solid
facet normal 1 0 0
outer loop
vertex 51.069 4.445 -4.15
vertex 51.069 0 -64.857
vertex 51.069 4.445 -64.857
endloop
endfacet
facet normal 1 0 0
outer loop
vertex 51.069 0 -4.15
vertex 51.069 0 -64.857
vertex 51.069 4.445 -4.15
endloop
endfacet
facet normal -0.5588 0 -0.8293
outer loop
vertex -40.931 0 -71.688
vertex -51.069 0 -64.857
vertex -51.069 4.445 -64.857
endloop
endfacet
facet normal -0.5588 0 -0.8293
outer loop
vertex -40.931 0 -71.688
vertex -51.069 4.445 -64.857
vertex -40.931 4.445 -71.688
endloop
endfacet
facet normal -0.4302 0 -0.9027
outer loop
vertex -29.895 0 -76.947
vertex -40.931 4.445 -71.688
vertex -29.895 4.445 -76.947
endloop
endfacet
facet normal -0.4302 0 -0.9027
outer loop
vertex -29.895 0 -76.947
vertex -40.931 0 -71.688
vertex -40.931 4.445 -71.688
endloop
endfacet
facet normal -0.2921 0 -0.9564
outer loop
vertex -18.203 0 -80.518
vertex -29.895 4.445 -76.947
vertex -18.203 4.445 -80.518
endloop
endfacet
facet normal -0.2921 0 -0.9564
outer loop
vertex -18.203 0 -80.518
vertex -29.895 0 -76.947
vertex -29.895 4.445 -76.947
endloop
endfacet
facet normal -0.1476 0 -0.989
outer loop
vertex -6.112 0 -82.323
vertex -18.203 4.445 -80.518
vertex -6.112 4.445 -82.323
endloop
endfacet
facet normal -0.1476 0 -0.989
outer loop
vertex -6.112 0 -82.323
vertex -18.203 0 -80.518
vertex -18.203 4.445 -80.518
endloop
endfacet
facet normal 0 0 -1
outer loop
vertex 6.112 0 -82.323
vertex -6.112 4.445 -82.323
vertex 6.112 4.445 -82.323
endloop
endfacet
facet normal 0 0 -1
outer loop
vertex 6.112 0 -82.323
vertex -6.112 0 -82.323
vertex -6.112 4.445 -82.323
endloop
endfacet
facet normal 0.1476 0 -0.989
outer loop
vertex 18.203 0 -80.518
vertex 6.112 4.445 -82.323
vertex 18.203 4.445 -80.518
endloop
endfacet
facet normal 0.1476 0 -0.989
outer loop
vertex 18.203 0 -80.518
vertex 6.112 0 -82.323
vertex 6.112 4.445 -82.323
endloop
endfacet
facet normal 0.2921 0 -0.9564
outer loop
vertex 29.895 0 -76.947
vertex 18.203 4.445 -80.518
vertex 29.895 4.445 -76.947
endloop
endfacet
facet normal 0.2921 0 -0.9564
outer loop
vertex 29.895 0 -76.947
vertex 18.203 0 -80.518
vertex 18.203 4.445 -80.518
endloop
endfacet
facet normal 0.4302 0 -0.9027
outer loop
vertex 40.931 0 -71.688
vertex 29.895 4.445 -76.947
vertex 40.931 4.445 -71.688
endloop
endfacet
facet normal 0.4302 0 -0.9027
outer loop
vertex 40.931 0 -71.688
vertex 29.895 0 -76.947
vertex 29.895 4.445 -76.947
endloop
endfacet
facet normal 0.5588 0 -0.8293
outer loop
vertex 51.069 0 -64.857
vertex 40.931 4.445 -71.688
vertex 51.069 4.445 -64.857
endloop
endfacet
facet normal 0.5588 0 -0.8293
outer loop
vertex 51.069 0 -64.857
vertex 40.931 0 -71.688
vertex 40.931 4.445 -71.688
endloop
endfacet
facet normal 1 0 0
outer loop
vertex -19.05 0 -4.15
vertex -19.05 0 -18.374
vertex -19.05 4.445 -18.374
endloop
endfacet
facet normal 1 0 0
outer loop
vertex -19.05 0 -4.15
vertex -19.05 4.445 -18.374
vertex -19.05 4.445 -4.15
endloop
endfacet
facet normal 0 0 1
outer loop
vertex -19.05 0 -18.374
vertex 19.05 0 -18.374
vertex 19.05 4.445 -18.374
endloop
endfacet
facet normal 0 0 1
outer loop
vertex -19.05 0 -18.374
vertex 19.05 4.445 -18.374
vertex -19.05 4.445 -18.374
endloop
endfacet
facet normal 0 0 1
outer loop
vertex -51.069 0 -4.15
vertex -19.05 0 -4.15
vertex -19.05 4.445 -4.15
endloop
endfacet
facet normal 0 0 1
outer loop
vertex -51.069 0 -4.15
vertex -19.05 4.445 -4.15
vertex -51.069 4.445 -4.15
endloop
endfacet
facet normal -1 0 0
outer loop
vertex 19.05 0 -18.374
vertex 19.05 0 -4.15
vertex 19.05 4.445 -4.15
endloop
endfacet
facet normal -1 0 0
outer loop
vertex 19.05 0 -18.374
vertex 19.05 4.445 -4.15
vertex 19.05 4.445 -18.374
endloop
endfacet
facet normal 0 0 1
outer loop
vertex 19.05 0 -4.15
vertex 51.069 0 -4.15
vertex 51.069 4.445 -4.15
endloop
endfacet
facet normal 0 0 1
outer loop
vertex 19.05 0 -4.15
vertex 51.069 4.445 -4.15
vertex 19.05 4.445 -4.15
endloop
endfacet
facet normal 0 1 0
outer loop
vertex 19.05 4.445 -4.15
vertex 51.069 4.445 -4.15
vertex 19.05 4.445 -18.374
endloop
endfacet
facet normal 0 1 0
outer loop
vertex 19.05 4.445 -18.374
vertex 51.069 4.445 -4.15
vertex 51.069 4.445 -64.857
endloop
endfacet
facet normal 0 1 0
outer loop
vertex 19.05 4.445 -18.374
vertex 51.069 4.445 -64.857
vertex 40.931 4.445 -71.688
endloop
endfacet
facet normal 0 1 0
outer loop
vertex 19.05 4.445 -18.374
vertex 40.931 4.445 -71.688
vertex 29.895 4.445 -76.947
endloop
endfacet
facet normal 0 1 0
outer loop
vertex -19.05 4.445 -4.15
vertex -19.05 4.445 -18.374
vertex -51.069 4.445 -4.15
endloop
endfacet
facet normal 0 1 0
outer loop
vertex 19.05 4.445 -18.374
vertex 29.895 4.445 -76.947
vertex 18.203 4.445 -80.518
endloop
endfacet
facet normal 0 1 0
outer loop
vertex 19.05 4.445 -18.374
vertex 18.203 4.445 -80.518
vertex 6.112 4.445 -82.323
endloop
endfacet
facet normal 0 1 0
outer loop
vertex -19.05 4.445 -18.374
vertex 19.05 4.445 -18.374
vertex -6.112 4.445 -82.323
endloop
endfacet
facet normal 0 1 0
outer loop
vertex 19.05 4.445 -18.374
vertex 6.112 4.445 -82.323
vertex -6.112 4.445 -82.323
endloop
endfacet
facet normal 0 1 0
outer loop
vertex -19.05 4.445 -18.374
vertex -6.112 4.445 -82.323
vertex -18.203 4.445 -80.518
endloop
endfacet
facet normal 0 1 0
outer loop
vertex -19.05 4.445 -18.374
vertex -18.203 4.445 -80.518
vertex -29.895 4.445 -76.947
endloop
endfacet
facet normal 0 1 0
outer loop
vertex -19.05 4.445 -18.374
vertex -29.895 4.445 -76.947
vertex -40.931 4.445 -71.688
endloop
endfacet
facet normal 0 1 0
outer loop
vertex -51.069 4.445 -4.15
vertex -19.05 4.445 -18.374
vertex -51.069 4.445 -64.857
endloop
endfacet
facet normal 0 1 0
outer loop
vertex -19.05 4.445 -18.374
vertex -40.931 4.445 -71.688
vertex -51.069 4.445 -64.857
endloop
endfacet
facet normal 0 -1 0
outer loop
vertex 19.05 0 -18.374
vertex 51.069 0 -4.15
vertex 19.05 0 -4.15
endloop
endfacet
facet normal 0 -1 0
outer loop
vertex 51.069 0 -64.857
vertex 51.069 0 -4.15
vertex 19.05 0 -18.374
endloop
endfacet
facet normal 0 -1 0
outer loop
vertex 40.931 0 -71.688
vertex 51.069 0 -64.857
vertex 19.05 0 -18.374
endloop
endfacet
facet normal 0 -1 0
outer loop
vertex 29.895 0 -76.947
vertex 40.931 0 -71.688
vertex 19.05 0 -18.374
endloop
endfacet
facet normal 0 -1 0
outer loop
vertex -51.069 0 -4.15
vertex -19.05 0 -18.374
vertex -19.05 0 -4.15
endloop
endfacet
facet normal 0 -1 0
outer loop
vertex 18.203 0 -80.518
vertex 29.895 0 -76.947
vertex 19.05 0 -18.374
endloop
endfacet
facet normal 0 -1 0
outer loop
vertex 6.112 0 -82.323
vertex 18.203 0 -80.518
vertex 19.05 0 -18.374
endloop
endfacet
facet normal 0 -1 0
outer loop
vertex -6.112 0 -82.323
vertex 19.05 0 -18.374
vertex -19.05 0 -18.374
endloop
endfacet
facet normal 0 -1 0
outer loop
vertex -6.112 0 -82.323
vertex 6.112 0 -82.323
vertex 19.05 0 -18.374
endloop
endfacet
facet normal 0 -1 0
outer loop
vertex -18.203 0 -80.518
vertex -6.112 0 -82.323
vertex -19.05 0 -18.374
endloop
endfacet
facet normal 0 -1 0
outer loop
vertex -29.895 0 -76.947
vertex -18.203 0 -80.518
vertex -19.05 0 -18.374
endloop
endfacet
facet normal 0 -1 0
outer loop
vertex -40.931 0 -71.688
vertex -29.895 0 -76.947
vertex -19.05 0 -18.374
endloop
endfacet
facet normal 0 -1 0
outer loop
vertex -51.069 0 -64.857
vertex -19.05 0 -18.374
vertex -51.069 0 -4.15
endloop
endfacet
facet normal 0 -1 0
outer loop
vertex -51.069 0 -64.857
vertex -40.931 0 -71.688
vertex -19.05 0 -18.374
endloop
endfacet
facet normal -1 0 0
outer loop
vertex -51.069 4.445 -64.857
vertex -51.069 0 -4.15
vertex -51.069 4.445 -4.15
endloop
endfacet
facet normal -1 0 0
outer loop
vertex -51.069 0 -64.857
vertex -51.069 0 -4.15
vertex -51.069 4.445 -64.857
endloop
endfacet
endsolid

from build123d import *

# Parameters (mm, degrees)
BOSS_EXTRUDE2_DEPTH = 4.445


with BuildPart() as part:
    # Sketch1 → Boss-Extrude2 (new body)
    with BuildSketch(Plane(origin=(0, 0, 0), x_dir=(1, 0, 0), z_dir=(0, 1, 0))):
        with BuildLine():
            Line((-51.06889371, 4.150009473), (-51.06889371, 64.857309497))
            ThreePointArc((-51.06889371, 64.857309497), (0, 82.55), (51.06889371, 64.857309497))
            Line((51.06889371, 64.857309497), (51.06889371, 4.150009473))
            Line((51.06889371, 4.150009473), (19.05, 4.150009473))
            Line((19.05, 4.150009473), (19.05, 14.2875))
            Line((19.05, 14.2875), (19.05, 18.374009473))
            Line((19.05, 18.374009473), (-19.05, 18.374009473))
            Line((-19.05, 18.374009473), (-19.05, 14.2875))
            Line((-19.05, 14.2875), (-19.05, 4.150009473))
            Line((-19.05, 4.150009473), (-51.06889371, 4.150009473))
        make_face()
    extrude(amount=BOSS_EXTRUDE2_DEPTH)


solid = part.part
